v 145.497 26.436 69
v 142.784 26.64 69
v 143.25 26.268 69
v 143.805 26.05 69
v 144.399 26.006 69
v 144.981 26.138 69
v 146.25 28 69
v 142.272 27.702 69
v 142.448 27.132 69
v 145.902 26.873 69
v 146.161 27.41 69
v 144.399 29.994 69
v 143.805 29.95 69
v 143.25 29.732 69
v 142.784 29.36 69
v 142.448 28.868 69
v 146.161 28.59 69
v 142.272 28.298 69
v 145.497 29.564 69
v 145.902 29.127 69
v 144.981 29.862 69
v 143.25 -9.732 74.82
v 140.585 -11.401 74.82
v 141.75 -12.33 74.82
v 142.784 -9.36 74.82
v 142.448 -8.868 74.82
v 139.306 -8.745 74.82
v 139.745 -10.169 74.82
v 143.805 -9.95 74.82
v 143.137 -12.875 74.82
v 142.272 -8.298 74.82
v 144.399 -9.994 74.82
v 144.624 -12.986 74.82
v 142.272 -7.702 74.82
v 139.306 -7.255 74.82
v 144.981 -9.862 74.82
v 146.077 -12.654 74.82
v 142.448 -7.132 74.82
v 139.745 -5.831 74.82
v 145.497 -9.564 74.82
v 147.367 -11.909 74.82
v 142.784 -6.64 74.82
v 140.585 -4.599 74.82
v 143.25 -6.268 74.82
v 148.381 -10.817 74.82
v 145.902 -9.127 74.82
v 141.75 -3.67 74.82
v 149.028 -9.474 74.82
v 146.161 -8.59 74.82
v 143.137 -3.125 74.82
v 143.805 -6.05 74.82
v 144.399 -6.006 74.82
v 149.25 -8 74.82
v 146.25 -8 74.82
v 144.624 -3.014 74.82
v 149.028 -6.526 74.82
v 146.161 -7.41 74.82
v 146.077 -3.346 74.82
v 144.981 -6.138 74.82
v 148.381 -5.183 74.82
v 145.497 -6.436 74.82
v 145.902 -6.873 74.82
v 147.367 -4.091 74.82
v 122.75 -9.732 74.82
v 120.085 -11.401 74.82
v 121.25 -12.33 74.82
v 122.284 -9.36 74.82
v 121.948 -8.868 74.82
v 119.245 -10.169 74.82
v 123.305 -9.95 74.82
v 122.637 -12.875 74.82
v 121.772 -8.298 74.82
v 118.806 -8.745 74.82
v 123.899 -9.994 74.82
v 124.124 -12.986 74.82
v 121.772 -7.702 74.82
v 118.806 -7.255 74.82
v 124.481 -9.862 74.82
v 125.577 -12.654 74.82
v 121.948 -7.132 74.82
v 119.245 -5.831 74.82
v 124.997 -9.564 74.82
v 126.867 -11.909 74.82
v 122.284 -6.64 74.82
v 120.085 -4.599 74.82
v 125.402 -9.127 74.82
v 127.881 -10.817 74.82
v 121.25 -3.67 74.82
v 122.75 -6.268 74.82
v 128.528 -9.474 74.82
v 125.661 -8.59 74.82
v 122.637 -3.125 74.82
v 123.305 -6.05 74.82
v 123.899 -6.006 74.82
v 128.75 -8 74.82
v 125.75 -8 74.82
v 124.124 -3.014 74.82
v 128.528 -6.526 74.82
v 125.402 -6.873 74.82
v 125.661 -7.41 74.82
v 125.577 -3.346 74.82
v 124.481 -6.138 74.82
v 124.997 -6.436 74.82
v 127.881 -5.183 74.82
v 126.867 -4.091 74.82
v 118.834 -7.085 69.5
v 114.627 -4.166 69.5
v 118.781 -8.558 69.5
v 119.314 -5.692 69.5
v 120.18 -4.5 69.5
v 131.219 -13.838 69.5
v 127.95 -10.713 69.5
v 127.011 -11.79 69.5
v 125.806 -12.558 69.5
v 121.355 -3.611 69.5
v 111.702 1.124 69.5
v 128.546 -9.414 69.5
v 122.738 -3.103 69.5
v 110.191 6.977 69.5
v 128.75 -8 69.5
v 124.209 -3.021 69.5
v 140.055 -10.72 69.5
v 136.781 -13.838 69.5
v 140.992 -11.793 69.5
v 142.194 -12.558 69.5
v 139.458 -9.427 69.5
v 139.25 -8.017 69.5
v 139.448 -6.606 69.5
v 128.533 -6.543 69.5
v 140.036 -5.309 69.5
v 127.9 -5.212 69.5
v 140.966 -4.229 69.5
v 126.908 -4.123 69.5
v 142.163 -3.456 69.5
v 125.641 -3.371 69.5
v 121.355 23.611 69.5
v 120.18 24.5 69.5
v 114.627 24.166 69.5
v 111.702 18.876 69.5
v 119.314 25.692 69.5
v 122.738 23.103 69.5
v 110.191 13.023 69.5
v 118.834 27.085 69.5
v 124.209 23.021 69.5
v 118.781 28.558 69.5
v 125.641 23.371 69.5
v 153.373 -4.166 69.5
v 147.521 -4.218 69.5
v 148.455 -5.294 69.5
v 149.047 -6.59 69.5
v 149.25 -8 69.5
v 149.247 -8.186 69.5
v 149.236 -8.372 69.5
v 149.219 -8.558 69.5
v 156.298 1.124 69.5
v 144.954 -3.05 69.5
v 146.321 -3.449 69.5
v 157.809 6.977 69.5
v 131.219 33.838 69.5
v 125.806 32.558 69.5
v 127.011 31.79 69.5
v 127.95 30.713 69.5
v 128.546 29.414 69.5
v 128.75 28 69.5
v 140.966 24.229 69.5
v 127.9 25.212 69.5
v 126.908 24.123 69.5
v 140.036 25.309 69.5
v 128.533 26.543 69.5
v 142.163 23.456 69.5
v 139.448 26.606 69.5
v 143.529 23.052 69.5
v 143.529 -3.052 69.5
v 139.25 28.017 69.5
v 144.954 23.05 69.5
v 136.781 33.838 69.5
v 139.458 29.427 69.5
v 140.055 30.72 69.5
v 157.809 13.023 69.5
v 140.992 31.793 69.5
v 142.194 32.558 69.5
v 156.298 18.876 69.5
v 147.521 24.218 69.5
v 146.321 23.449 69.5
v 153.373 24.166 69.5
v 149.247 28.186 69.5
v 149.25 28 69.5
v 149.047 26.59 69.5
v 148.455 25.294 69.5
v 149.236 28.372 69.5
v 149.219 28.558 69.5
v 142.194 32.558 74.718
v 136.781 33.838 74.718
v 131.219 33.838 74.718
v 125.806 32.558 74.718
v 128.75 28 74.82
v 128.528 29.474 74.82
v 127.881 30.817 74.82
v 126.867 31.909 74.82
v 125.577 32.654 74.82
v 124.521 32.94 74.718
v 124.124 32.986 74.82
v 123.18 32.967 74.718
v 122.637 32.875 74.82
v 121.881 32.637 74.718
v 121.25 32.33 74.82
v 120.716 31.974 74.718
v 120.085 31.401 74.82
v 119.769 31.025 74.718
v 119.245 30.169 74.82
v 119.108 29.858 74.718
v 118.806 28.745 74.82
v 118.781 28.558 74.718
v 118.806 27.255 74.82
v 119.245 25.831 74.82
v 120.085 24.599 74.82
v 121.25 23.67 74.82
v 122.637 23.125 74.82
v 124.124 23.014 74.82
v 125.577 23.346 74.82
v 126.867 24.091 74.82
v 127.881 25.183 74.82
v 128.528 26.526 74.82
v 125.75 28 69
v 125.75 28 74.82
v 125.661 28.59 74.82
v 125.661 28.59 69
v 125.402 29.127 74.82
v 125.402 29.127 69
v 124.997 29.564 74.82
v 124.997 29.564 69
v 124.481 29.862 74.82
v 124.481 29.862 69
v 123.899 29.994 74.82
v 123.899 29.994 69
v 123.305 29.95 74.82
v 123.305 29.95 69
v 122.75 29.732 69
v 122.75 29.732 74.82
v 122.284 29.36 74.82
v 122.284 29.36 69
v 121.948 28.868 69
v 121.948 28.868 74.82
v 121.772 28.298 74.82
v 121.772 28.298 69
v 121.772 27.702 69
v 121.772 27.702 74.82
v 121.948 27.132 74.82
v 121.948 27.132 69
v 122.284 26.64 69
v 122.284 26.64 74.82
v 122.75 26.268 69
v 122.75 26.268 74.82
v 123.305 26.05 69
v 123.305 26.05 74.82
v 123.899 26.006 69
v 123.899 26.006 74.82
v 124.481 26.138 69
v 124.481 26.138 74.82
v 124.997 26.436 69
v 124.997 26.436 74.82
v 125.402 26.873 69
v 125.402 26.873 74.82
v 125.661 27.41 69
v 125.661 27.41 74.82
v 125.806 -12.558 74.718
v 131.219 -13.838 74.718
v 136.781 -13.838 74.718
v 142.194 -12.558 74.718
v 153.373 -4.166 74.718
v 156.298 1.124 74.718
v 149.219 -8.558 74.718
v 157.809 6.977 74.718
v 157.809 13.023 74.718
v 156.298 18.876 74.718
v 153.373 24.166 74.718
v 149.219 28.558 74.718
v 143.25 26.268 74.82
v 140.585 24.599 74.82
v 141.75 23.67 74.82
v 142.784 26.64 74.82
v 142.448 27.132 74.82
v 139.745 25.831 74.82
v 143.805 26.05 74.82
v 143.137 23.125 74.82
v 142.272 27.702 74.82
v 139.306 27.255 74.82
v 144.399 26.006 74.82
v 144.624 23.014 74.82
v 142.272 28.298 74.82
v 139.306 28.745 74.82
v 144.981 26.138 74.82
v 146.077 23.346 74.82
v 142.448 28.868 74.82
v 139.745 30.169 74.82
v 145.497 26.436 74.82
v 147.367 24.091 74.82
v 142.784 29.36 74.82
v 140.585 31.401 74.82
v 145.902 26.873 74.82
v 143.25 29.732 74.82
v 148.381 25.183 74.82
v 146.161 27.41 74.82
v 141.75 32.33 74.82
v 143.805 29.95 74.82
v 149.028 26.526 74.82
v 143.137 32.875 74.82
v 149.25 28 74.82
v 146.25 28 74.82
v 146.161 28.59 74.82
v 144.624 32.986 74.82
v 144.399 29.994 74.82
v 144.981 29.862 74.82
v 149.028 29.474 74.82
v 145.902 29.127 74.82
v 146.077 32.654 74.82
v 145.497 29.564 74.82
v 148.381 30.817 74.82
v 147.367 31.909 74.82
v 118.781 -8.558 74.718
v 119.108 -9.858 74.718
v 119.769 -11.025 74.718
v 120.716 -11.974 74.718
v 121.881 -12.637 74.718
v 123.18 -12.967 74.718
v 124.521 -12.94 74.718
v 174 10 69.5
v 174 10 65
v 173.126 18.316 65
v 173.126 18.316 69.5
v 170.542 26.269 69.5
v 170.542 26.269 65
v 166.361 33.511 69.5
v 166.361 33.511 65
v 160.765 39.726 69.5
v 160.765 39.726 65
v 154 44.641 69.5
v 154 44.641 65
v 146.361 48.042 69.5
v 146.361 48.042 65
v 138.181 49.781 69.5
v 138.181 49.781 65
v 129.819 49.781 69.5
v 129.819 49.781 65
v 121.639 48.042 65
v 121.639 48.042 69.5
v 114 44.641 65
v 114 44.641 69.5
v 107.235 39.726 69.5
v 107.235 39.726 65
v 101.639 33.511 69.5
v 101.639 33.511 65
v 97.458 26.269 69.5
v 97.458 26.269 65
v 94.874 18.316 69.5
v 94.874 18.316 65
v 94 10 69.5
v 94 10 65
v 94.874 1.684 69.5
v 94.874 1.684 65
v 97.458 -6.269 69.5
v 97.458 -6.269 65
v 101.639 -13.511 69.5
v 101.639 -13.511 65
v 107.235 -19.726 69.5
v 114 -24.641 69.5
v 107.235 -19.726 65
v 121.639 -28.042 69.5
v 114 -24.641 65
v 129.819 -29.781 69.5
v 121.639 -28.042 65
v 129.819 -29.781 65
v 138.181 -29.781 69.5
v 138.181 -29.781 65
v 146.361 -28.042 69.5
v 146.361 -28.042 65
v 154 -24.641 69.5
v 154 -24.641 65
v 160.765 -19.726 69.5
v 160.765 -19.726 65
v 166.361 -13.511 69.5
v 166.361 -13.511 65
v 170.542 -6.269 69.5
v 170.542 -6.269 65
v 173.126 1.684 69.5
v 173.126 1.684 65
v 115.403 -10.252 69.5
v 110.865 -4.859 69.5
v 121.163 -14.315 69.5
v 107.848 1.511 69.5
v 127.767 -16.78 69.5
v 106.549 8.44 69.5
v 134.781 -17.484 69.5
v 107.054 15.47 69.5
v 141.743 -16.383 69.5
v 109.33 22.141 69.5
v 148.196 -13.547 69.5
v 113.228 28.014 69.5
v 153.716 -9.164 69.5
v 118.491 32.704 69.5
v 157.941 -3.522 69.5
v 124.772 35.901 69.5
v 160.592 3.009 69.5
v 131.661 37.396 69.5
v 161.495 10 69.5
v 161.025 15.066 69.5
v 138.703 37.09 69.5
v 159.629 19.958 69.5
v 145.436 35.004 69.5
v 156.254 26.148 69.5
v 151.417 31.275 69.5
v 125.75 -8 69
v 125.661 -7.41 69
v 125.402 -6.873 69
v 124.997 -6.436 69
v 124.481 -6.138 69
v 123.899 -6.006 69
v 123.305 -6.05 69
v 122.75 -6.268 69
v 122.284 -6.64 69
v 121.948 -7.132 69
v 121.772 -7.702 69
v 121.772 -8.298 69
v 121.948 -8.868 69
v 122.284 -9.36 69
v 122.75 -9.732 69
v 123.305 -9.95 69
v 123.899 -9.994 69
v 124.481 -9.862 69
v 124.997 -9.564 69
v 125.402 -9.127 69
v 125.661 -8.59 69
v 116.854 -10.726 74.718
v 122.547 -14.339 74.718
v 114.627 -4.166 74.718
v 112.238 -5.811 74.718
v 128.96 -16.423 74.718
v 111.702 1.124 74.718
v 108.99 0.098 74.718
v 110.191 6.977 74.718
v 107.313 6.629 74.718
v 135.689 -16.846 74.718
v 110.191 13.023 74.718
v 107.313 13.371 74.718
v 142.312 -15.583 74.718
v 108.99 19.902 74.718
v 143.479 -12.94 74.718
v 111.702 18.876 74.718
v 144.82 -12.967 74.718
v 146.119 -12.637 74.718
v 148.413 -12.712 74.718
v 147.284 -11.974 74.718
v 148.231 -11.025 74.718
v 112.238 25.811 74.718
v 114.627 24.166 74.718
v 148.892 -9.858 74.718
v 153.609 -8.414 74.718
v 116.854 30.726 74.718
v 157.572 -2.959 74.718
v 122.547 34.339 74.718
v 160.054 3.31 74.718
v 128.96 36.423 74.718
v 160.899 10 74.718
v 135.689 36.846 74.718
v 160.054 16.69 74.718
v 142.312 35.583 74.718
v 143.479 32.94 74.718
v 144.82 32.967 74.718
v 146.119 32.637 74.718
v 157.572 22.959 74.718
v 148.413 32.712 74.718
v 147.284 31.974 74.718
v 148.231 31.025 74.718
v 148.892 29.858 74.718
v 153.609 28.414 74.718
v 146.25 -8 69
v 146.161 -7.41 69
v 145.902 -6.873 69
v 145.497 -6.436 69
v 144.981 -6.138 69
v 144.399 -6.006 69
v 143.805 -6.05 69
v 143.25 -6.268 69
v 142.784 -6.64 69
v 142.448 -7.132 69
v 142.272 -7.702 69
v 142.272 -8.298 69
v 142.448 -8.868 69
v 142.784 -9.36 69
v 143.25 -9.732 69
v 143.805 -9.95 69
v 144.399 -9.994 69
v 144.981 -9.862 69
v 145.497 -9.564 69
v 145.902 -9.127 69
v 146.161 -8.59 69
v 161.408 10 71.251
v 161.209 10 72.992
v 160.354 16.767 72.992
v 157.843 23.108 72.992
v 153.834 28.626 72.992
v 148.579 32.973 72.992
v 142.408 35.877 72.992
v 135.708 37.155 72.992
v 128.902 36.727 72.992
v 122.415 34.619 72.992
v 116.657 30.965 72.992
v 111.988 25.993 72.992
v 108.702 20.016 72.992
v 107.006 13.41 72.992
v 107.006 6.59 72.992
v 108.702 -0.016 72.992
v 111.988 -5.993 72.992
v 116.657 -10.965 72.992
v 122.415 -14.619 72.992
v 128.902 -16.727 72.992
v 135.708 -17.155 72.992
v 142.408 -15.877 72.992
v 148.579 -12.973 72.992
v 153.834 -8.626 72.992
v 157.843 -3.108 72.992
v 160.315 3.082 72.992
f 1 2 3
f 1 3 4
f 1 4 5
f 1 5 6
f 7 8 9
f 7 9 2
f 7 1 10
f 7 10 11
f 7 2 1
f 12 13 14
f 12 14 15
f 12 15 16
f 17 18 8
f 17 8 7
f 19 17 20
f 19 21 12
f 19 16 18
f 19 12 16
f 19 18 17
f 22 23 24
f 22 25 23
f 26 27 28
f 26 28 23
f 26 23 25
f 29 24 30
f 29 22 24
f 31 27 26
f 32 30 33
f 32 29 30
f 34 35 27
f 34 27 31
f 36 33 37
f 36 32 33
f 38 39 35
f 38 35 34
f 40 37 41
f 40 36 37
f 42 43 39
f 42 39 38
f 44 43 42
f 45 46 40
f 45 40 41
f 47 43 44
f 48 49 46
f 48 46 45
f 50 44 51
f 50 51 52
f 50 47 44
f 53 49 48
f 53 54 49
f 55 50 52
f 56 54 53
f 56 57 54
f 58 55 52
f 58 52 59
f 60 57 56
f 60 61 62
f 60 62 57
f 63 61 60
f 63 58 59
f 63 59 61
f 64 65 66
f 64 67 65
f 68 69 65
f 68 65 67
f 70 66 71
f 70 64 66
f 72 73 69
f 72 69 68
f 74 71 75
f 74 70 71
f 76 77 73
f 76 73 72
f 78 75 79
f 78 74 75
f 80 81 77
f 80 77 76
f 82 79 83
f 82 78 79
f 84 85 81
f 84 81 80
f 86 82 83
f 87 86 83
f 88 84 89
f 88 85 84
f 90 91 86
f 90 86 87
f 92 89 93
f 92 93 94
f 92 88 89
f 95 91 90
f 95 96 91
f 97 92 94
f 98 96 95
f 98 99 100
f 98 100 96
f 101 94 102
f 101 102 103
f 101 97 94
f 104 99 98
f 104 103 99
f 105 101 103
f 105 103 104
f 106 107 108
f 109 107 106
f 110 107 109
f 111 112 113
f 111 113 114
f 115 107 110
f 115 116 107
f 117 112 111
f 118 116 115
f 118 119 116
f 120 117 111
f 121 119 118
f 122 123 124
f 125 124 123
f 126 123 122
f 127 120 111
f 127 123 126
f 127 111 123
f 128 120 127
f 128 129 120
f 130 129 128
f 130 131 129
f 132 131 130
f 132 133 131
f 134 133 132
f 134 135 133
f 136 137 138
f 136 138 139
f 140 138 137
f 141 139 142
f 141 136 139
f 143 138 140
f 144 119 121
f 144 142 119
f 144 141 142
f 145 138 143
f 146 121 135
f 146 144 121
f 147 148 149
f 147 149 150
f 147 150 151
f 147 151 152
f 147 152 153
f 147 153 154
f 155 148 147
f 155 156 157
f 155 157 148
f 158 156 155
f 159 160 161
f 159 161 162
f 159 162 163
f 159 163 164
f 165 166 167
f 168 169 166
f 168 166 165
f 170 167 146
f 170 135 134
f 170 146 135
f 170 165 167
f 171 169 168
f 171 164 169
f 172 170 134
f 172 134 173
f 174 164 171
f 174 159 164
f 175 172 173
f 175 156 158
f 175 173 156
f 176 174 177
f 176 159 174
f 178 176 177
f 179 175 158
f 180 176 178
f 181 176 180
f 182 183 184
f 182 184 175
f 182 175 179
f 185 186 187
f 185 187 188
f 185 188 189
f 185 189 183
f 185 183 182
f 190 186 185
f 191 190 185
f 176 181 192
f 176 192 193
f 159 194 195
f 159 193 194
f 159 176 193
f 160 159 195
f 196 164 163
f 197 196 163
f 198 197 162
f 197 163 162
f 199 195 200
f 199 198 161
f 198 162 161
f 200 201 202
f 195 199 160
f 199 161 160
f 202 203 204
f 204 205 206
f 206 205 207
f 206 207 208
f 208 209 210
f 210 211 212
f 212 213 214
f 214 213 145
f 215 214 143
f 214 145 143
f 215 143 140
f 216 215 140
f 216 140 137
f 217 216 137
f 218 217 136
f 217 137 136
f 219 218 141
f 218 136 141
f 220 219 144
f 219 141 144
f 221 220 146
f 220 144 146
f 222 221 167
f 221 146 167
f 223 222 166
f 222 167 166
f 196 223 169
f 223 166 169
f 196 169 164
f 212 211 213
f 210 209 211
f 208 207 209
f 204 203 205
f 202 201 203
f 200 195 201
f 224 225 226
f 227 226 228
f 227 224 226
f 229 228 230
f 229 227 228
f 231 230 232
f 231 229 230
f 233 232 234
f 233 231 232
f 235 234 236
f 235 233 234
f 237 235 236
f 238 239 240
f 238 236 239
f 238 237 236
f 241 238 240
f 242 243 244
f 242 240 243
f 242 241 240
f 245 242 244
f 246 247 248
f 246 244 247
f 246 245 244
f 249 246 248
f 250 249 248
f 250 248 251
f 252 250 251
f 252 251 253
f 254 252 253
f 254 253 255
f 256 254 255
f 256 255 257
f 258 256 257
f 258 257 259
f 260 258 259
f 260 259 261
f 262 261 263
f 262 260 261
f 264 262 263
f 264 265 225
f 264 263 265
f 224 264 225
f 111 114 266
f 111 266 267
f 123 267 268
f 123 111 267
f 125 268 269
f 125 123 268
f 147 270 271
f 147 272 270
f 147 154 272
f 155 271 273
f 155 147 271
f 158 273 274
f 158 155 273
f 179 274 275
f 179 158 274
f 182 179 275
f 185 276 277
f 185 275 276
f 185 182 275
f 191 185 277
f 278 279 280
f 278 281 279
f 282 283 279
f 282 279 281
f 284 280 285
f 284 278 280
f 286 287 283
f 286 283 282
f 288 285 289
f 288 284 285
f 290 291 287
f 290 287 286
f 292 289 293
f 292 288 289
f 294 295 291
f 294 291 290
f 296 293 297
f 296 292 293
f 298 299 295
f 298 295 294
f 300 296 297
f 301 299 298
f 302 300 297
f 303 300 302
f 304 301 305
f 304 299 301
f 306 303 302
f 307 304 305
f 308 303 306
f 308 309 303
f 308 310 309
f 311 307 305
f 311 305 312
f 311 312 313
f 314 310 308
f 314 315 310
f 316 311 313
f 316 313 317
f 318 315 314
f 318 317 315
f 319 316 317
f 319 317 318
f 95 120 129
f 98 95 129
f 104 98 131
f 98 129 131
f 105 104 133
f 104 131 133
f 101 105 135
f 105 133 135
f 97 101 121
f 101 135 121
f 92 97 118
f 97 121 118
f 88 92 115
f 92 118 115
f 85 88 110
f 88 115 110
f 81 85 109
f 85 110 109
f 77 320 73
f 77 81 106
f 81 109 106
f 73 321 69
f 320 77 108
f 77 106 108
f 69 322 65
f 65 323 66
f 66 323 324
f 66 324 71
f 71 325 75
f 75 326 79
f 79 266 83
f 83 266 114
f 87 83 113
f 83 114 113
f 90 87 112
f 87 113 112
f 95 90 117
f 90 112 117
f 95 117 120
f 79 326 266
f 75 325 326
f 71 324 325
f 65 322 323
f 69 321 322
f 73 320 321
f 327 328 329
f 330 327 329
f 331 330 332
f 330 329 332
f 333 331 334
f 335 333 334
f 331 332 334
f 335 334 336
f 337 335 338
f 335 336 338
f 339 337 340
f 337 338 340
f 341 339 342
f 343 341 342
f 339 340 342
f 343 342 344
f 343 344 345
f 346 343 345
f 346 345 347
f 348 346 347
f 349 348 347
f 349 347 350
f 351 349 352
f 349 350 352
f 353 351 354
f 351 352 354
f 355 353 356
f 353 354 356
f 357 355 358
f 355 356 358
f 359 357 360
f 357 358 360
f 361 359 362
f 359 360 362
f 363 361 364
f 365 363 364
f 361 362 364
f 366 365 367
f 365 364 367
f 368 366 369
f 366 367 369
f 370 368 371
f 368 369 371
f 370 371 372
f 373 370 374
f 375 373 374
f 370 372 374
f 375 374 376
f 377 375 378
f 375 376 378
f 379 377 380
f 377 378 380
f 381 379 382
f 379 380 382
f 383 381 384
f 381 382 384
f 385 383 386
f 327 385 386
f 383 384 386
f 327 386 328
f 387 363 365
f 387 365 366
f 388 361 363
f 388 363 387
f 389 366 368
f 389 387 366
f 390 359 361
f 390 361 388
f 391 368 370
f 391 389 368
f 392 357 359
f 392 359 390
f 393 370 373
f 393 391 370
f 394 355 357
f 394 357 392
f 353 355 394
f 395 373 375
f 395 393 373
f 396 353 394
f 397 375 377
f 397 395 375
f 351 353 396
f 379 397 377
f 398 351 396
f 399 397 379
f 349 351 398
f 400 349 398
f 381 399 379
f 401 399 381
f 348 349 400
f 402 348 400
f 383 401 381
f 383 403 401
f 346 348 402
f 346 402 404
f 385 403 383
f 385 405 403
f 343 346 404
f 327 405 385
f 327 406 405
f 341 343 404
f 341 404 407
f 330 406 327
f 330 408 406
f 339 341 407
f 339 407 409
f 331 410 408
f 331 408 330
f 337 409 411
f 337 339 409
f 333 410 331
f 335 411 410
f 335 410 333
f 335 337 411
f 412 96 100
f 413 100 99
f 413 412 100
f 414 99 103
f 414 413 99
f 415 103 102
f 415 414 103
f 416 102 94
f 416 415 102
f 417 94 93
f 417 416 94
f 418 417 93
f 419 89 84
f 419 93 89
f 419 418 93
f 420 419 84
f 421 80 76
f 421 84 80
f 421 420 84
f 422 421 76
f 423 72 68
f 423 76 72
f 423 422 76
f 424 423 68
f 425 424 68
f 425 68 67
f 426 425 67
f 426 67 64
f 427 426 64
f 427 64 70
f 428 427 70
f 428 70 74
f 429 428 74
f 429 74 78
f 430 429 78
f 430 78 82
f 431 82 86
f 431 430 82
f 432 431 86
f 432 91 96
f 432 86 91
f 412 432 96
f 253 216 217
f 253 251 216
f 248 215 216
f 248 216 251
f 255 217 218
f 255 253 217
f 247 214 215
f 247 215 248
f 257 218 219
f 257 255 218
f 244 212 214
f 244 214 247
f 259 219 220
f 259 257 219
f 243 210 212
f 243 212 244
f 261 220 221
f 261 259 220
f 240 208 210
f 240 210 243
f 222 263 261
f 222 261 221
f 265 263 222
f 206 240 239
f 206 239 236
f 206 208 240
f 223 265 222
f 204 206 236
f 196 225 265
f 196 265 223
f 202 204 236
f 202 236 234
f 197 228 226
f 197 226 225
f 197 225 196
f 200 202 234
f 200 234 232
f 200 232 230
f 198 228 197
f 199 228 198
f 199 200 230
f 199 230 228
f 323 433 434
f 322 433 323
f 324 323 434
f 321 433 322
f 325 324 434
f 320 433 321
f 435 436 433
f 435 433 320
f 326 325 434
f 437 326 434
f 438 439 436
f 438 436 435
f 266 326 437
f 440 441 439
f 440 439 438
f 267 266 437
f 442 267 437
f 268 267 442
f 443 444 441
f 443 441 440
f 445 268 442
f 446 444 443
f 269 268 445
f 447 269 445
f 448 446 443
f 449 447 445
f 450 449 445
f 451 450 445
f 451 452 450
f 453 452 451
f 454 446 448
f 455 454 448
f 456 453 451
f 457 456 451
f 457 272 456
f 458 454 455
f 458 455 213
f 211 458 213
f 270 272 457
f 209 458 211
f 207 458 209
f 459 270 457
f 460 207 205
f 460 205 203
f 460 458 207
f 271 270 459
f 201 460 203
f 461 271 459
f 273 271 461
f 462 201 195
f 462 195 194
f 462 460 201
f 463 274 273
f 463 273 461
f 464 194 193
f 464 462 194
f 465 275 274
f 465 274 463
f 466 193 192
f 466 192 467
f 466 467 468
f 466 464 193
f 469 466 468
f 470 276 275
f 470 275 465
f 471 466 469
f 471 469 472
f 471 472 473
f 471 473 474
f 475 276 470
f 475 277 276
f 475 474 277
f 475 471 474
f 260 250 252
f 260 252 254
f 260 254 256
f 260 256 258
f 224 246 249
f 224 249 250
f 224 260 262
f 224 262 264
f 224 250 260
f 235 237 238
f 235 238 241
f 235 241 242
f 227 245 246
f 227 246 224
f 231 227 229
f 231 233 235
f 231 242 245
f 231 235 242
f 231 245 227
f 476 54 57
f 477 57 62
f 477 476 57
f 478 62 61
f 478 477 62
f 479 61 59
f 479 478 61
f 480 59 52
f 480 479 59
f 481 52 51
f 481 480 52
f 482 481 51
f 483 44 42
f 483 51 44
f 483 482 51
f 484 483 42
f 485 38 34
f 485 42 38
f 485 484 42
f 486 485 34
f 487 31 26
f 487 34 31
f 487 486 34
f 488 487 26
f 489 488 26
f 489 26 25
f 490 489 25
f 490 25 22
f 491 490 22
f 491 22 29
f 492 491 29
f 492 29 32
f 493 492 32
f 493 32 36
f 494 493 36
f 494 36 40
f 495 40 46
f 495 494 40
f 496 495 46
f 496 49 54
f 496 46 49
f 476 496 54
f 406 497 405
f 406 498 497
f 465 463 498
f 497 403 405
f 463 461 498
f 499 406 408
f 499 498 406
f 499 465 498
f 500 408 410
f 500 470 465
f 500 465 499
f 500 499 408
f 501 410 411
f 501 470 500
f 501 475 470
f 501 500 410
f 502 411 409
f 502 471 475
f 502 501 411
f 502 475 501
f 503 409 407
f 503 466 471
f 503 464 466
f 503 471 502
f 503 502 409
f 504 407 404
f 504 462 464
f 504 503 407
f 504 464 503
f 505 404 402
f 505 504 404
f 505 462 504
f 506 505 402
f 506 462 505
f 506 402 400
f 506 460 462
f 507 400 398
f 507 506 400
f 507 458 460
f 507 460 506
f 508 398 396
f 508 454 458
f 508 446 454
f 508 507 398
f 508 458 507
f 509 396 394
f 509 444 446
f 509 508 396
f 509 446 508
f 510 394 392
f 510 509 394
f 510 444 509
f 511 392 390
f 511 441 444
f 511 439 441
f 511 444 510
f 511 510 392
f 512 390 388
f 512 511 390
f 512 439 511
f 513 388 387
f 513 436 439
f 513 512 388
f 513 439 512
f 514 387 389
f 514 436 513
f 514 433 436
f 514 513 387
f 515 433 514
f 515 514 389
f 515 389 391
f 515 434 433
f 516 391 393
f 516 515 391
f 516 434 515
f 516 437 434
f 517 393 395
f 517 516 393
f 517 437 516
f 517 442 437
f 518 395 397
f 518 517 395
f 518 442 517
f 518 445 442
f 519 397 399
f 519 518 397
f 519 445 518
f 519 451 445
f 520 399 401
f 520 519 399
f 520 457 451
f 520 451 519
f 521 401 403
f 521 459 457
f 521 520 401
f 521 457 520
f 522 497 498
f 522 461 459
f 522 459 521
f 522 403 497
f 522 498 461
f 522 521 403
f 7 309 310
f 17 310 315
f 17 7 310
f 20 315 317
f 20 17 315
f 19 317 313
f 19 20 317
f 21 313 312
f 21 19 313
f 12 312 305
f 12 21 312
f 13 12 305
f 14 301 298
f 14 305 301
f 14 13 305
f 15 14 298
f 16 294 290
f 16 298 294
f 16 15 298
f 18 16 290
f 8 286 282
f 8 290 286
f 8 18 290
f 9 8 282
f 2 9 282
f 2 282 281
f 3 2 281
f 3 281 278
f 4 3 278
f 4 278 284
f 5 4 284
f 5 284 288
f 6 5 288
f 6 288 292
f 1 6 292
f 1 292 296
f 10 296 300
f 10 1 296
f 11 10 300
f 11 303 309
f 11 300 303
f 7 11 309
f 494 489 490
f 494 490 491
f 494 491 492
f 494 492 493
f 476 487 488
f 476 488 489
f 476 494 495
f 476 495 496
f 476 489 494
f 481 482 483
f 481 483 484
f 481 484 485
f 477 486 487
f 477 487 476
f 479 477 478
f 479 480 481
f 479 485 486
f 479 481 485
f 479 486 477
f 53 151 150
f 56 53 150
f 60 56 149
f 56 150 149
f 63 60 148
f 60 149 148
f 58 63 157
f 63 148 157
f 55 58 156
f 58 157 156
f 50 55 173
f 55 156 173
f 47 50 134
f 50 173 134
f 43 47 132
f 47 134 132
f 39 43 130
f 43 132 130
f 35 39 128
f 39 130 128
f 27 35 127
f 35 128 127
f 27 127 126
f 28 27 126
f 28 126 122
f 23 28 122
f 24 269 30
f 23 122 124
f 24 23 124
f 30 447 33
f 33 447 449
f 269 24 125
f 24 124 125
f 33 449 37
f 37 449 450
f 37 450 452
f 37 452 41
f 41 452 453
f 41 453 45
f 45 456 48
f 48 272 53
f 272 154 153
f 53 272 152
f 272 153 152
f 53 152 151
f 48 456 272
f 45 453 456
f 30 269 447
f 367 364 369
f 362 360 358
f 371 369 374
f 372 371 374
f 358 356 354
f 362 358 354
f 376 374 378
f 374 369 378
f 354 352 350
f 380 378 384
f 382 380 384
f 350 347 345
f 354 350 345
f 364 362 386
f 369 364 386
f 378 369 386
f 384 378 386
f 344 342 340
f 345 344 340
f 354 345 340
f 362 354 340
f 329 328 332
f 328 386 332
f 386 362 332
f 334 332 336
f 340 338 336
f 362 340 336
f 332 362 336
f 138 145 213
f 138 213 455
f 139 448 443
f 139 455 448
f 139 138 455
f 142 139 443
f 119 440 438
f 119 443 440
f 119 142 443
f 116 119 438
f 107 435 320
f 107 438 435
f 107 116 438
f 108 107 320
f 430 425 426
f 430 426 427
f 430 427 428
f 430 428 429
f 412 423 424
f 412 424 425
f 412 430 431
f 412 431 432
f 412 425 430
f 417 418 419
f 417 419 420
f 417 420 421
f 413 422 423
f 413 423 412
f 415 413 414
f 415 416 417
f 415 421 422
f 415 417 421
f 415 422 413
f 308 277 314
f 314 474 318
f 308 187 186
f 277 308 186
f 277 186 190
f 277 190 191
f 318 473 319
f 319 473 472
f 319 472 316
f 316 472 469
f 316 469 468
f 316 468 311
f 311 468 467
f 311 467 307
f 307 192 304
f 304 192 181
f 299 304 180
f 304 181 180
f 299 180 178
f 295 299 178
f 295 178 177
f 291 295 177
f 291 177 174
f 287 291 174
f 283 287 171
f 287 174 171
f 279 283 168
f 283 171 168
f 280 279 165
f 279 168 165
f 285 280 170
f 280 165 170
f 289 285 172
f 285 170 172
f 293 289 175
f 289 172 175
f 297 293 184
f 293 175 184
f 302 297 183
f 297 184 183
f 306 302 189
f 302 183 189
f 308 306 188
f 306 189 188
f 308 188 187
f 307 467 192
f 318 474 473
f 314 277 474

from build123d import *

# Parameters (mm, degrees)
CYLINDER180_R             = 2
CYLINDER180_DEPTH         = 10
CYLINDER181_R             = 2
CYLINDER181_DEPTH         = 10
CYLINDER182_R             = 2
CYLINDER182_DEPTH         = 10
CYLINDER183_R             = 2
CYLINDER183_DEPTH         = 10
CYLINDER170_R             = 2
CYLINDER170_DEPTH         = 10
CYLINDER171_R             = 2
CYLINDER171_DEPTH         = 10
CYLINDER172_R             = 2
CYLINDER172_DEPTH         = 10
CYLINDER169_R             = 2
CYLINDER169_DEPTH         = 10
FUSION111_PLACEMENT_ANGLE = 45
CYLINDER175_R             = 5.5
CYLINDER175_DEPTH         = 1
CYLINDER176_R             = 5
CYLINDER176_DEPTH         = 5.82
CYLINDER177_R             = 5
CYLINDER177_DEPTH         = 5.82
CYLINDER178_R             = 5
CYLINDER178_DEPTH         = 5.82
CYLINDER179_R             = 5
CYLINDER179_DEPTH         = 5.82
CYLINDER173_R             = 40
CYLINDER173_DEPTH         = 4.5
CYLINDER174_R             = 24
CYLINDER174_DEPTH         = 7


with BuildPart() as cylinder180:
    # Cylinder180 → Cylinder180 (new body)
    with BuildSketch(Plane(origin=(0, -21, 0), x_dir=(1, 0, 0), z_dir=(0, 0, 1))):
        Circle(CYLINDER180_R)
    extrude(amount=CYLINDER180_DEPTH)


with BuildPart() as m3heatsetcuts031:
    # Cylinder181 → Cylinder181 (new body)
    with BuildSketch(Plane(origin=(20.5, -21, 0), x_dir=(1, 0, 0), z_dir=(0, 0, 1))):
        Circle(CYLINDER181_R)
    extrude(amount=CYLINDER181_DEPTH)

    # Fusion118: union Cylinder180
    add(cylinder180.part)


with BuildPart() as m3heatsetcuts031_1:
    # Fusion118 placement: moved
    add(m3heatsetcuts031.part.moved(Location((-5, 39, 70))))


with BuildPart() as cylinder182:
    # Cylinder182 → Cylinder182 (new body)
    with BuildSketch(Plane(origin=(0, -21, 0), x_dir=(1, 0, 0), z_dir=(0, 0, 1))):
        Circle(CYLINDER182_R)
    extrude(amount=CYLINDER182_DEPTH)


with BuildPart() as m3heatsetcuts030:
    # Cylinder183 → Cylinder183 (new body)
    with BuildSketch(Plane(origin=(20.5, -21, 0), x_dir=(1, 0, 0), z_dir=(0, 0, 1))):
        Circle(CYLINDER183_R)
    extrude(amount=CYLINDER183_DEPTH)

    # Fusion119: union Cylinder182
    add(cylinder182.part)


with BuildPart() as m3heatsetcuts030_1:
    # Fusion119 placement: moved
    add(m3heatsetcuts030.part.moved(Location((-5, 3, 70))))

    # Fusion117: union m3HeatSetCuts031
    add(m3heatsetcuts031_1.part)


with BuildPart() as m3heatsetcuts030_2:
    # Fusion117 placement: moved
    add(m3heatsetcuts030_1.part.moved(Location((128.75, 10, -1))))


with BuildPart() as m2heatsetinsets021:
    # Cylinder170 → Cylinder170 (new body)
    with BuildSketch(Plane(origin=(35, 0, 65), x_dir=(1, 0, 0), z_dir=(0, 0, 1))):
        Circle(CYLINDER170_R)
    extrude(amount=CYLINDER170_DEPTH)


with BuildPart() as m2heatsetinsets022:
    # Cylinder171 → Cylinder171 (new body)
    with BuildSketch(Plane(origin=(0, 35, 65), x_dir=(1, 0, 0), z_dir=(0, 0, 1))):
        Circle(CYLINDER171_R)
    extrude(amount=CYLINDER171_DEPTH)


with BuildPart() as m2heatsetinsets023:
    # Cylinder172 → Cylinder172 (new body)
    with BuildSketch(Plane(origin=(0, -35, 65), x_dir=(1, 0, 0), z_dir=(0, 0, 1))):
        Circle(CYLINDER172_R)
    extrude(amount=CYLINDER172_DEPTH)


with BuildPart() as fusion120:
    # Cylinder169 → Cylinder169 (new body)
    with BuildSketch(Plane(origin=(-35, 0, 65), x_dir=(1, 0, 0), z_dir=(0, 0, 1))):
        Circle(CYLINDER169_R)
    extrude(amount=CYLINDER169_DEPTH)

    # Fusion111: union m2HeatSetInsets021, m2HeatSetInsets022, m2HeatSetInsets023
    add(m2heatsetinsets021.part)
    add(m2heatsetinsets022.part)
    add(m2heatsetinsets023.part)


with BuildPart() as fusion120_1:
    # Fusion111 placement: moved
    add(fusion120.part.moved(Location((0, -374, -75))).rotate(Axis((0, -374, -75), (0, 0, -1)), FUSION111_PLACEMENT_ANGLE))

    # Fusion120: union m3HeatSetCuts030
    add(m3heatsetcuts030_2.part)


with BuildPart() as cylinder175:
    # Cylinder175 → Cylinder175 (new body)
    with BuildSketch(Plane(origin=(134, 32.6, 65), x_dir=(1, 0, 0), z_dir=(0, 0, 1))):
        Circle(CYLINDER175_R)
    extrude(amount=CYLINDER175_DEPTH)


with BuildPart() as cylinder176:
    # Cylinder176 → Cylinder176 (new body)
    with BuildSketch(Plane(origin=(0, -21, 0), x_dir=(1, 0, 0), z_dir=(0, 0, 1))):
        Circle(CYLINDER176_R)
    extrude(amount=CYLINDER176_DEPTH)


with BuildPart() as m3heatsetcuts027:
    # Cylinder177 → Cylinder177 (new body)
    with BuildSketch(Plane(origin=(20.5, -21, 0), x_dir=(1, 0, 0), z_dir=(0, 0, 1))):
        Circle(CYLINDER177_R)
    extrude(amount=CYLINDER177_DEPTH)

    # Fusion112: union Cylinder176
    add(cylinder176.part)


with BuildPart() as m3heatsetcuts027_1:
    # Fusion112 placement: moved
    add(m3heatsetcuts027.part.moved(Location((-5, 39, 70))))


with BuildPart() as cylinder178:
    # Cylinder178 → Cylinder178 (new body)
    with BuildSketch(Plane(origin=(0, -21, 0), x_dir=(1, 0, 0), z_dir=(0, 0, 1))):
        Circle(CYLINDER178_R)
    extrude(amount=CYLINDER178_DEPTH)


with BuildPart() as m3heatsetcuts029:
    # Cylinder179 → Cylinder179 (new body)
    with BuildSketch(Plane(origin=(20.5, -21, 0), x_dir=(1, 0, 0), z_dir=(0, 0, 1))):
        Circle(CYLINDER179_R)
    extrude(amount=CYLINDER179_DEPTH)

    # Fusion113: union Cylinder178
    add(cylinder178.part)


with BuildPart() as m3heatsetcuts029_1:
    # Fusion113 placement: moved
    add(m3heatsetcuts029.part.moved(Location((-5, 3, 70))))

    # Fusion114: union m3HeatSetCuts027
    add(m3heatsetcuts027_1.part)


with BuildPart() as m3heatsetcuts029_2:
    # Fusion114 placement: moved
    add(m3heatsetcuts029_1.part.moved(Location((128.75, 10, -1))))


with BuildPart() as base015:
    # Cylinder173 → Cylinder173 (new body)
    with BuildSketch(Plane(origin=(136, 0, 65), x_dir=(1, 0, 0), z_dir=(0, 0, 1))):
        Circle(CYLINDER173_R)
    extrude(amount=CYLINDER173_DEPTH)


with BuildPart() as basecut004:
    # Cylinder174 → Cylinder174 (new body)
    with BuildSketch(Plane(origin=(5, 0, 74), x_dir=(1, 0, 0), z_dir=(0, 0, 1))):
        Circle(CYLINDER174_R)
    extrude(amount=CYLINDER174_DEPTH)


with BuildPart() as cut059:
    # Sphere006 → Sphere006 (revolve)
    with BuildSketch(Plane(origin=(5, 0, 74), x_dir=(1, 0, 0), z_dir=(0, -1, 0))):
        with BuildLine():
            ThreePointArc((27.5, 0), (27.349352, 2.874533), (26.899059, 5.717571))
            Line((26.899059, 5.717571), (0, 5.717571))
            Line((0, 5.717571), (0, 0))
            Line((0, 0), (27.5, 0))
        make_face()
    revolve(axis=Axis((5, 0, 74), (0, 0, 1)))

    # Cut058: cut baseCut004
    add(basecut004.part, mode=Mode.SUBTRACT)


with BuildPart() as cut059_1:
    # Cut058 placement: moved
    add(cut059.part.moved(Location((131, 0, -5))))

    # Fusion115: union base015
    add(base015.part)


with BuildPart() as cut059_2:
    # Fusion115 placement: moved
    add(cut059_1.part.moved(Location((-2, 10, 0))))

    # Fusion116: union Cylinder175, m3HeatSetCuts029
    add(cylinder175.part)
    add(m3heatsetcuts029_2.part)

    # Cut059: cut Fusion120
    add(fusion120_1.part, mode=Mode.SUBTRACT)


solid = cut059_2.part
